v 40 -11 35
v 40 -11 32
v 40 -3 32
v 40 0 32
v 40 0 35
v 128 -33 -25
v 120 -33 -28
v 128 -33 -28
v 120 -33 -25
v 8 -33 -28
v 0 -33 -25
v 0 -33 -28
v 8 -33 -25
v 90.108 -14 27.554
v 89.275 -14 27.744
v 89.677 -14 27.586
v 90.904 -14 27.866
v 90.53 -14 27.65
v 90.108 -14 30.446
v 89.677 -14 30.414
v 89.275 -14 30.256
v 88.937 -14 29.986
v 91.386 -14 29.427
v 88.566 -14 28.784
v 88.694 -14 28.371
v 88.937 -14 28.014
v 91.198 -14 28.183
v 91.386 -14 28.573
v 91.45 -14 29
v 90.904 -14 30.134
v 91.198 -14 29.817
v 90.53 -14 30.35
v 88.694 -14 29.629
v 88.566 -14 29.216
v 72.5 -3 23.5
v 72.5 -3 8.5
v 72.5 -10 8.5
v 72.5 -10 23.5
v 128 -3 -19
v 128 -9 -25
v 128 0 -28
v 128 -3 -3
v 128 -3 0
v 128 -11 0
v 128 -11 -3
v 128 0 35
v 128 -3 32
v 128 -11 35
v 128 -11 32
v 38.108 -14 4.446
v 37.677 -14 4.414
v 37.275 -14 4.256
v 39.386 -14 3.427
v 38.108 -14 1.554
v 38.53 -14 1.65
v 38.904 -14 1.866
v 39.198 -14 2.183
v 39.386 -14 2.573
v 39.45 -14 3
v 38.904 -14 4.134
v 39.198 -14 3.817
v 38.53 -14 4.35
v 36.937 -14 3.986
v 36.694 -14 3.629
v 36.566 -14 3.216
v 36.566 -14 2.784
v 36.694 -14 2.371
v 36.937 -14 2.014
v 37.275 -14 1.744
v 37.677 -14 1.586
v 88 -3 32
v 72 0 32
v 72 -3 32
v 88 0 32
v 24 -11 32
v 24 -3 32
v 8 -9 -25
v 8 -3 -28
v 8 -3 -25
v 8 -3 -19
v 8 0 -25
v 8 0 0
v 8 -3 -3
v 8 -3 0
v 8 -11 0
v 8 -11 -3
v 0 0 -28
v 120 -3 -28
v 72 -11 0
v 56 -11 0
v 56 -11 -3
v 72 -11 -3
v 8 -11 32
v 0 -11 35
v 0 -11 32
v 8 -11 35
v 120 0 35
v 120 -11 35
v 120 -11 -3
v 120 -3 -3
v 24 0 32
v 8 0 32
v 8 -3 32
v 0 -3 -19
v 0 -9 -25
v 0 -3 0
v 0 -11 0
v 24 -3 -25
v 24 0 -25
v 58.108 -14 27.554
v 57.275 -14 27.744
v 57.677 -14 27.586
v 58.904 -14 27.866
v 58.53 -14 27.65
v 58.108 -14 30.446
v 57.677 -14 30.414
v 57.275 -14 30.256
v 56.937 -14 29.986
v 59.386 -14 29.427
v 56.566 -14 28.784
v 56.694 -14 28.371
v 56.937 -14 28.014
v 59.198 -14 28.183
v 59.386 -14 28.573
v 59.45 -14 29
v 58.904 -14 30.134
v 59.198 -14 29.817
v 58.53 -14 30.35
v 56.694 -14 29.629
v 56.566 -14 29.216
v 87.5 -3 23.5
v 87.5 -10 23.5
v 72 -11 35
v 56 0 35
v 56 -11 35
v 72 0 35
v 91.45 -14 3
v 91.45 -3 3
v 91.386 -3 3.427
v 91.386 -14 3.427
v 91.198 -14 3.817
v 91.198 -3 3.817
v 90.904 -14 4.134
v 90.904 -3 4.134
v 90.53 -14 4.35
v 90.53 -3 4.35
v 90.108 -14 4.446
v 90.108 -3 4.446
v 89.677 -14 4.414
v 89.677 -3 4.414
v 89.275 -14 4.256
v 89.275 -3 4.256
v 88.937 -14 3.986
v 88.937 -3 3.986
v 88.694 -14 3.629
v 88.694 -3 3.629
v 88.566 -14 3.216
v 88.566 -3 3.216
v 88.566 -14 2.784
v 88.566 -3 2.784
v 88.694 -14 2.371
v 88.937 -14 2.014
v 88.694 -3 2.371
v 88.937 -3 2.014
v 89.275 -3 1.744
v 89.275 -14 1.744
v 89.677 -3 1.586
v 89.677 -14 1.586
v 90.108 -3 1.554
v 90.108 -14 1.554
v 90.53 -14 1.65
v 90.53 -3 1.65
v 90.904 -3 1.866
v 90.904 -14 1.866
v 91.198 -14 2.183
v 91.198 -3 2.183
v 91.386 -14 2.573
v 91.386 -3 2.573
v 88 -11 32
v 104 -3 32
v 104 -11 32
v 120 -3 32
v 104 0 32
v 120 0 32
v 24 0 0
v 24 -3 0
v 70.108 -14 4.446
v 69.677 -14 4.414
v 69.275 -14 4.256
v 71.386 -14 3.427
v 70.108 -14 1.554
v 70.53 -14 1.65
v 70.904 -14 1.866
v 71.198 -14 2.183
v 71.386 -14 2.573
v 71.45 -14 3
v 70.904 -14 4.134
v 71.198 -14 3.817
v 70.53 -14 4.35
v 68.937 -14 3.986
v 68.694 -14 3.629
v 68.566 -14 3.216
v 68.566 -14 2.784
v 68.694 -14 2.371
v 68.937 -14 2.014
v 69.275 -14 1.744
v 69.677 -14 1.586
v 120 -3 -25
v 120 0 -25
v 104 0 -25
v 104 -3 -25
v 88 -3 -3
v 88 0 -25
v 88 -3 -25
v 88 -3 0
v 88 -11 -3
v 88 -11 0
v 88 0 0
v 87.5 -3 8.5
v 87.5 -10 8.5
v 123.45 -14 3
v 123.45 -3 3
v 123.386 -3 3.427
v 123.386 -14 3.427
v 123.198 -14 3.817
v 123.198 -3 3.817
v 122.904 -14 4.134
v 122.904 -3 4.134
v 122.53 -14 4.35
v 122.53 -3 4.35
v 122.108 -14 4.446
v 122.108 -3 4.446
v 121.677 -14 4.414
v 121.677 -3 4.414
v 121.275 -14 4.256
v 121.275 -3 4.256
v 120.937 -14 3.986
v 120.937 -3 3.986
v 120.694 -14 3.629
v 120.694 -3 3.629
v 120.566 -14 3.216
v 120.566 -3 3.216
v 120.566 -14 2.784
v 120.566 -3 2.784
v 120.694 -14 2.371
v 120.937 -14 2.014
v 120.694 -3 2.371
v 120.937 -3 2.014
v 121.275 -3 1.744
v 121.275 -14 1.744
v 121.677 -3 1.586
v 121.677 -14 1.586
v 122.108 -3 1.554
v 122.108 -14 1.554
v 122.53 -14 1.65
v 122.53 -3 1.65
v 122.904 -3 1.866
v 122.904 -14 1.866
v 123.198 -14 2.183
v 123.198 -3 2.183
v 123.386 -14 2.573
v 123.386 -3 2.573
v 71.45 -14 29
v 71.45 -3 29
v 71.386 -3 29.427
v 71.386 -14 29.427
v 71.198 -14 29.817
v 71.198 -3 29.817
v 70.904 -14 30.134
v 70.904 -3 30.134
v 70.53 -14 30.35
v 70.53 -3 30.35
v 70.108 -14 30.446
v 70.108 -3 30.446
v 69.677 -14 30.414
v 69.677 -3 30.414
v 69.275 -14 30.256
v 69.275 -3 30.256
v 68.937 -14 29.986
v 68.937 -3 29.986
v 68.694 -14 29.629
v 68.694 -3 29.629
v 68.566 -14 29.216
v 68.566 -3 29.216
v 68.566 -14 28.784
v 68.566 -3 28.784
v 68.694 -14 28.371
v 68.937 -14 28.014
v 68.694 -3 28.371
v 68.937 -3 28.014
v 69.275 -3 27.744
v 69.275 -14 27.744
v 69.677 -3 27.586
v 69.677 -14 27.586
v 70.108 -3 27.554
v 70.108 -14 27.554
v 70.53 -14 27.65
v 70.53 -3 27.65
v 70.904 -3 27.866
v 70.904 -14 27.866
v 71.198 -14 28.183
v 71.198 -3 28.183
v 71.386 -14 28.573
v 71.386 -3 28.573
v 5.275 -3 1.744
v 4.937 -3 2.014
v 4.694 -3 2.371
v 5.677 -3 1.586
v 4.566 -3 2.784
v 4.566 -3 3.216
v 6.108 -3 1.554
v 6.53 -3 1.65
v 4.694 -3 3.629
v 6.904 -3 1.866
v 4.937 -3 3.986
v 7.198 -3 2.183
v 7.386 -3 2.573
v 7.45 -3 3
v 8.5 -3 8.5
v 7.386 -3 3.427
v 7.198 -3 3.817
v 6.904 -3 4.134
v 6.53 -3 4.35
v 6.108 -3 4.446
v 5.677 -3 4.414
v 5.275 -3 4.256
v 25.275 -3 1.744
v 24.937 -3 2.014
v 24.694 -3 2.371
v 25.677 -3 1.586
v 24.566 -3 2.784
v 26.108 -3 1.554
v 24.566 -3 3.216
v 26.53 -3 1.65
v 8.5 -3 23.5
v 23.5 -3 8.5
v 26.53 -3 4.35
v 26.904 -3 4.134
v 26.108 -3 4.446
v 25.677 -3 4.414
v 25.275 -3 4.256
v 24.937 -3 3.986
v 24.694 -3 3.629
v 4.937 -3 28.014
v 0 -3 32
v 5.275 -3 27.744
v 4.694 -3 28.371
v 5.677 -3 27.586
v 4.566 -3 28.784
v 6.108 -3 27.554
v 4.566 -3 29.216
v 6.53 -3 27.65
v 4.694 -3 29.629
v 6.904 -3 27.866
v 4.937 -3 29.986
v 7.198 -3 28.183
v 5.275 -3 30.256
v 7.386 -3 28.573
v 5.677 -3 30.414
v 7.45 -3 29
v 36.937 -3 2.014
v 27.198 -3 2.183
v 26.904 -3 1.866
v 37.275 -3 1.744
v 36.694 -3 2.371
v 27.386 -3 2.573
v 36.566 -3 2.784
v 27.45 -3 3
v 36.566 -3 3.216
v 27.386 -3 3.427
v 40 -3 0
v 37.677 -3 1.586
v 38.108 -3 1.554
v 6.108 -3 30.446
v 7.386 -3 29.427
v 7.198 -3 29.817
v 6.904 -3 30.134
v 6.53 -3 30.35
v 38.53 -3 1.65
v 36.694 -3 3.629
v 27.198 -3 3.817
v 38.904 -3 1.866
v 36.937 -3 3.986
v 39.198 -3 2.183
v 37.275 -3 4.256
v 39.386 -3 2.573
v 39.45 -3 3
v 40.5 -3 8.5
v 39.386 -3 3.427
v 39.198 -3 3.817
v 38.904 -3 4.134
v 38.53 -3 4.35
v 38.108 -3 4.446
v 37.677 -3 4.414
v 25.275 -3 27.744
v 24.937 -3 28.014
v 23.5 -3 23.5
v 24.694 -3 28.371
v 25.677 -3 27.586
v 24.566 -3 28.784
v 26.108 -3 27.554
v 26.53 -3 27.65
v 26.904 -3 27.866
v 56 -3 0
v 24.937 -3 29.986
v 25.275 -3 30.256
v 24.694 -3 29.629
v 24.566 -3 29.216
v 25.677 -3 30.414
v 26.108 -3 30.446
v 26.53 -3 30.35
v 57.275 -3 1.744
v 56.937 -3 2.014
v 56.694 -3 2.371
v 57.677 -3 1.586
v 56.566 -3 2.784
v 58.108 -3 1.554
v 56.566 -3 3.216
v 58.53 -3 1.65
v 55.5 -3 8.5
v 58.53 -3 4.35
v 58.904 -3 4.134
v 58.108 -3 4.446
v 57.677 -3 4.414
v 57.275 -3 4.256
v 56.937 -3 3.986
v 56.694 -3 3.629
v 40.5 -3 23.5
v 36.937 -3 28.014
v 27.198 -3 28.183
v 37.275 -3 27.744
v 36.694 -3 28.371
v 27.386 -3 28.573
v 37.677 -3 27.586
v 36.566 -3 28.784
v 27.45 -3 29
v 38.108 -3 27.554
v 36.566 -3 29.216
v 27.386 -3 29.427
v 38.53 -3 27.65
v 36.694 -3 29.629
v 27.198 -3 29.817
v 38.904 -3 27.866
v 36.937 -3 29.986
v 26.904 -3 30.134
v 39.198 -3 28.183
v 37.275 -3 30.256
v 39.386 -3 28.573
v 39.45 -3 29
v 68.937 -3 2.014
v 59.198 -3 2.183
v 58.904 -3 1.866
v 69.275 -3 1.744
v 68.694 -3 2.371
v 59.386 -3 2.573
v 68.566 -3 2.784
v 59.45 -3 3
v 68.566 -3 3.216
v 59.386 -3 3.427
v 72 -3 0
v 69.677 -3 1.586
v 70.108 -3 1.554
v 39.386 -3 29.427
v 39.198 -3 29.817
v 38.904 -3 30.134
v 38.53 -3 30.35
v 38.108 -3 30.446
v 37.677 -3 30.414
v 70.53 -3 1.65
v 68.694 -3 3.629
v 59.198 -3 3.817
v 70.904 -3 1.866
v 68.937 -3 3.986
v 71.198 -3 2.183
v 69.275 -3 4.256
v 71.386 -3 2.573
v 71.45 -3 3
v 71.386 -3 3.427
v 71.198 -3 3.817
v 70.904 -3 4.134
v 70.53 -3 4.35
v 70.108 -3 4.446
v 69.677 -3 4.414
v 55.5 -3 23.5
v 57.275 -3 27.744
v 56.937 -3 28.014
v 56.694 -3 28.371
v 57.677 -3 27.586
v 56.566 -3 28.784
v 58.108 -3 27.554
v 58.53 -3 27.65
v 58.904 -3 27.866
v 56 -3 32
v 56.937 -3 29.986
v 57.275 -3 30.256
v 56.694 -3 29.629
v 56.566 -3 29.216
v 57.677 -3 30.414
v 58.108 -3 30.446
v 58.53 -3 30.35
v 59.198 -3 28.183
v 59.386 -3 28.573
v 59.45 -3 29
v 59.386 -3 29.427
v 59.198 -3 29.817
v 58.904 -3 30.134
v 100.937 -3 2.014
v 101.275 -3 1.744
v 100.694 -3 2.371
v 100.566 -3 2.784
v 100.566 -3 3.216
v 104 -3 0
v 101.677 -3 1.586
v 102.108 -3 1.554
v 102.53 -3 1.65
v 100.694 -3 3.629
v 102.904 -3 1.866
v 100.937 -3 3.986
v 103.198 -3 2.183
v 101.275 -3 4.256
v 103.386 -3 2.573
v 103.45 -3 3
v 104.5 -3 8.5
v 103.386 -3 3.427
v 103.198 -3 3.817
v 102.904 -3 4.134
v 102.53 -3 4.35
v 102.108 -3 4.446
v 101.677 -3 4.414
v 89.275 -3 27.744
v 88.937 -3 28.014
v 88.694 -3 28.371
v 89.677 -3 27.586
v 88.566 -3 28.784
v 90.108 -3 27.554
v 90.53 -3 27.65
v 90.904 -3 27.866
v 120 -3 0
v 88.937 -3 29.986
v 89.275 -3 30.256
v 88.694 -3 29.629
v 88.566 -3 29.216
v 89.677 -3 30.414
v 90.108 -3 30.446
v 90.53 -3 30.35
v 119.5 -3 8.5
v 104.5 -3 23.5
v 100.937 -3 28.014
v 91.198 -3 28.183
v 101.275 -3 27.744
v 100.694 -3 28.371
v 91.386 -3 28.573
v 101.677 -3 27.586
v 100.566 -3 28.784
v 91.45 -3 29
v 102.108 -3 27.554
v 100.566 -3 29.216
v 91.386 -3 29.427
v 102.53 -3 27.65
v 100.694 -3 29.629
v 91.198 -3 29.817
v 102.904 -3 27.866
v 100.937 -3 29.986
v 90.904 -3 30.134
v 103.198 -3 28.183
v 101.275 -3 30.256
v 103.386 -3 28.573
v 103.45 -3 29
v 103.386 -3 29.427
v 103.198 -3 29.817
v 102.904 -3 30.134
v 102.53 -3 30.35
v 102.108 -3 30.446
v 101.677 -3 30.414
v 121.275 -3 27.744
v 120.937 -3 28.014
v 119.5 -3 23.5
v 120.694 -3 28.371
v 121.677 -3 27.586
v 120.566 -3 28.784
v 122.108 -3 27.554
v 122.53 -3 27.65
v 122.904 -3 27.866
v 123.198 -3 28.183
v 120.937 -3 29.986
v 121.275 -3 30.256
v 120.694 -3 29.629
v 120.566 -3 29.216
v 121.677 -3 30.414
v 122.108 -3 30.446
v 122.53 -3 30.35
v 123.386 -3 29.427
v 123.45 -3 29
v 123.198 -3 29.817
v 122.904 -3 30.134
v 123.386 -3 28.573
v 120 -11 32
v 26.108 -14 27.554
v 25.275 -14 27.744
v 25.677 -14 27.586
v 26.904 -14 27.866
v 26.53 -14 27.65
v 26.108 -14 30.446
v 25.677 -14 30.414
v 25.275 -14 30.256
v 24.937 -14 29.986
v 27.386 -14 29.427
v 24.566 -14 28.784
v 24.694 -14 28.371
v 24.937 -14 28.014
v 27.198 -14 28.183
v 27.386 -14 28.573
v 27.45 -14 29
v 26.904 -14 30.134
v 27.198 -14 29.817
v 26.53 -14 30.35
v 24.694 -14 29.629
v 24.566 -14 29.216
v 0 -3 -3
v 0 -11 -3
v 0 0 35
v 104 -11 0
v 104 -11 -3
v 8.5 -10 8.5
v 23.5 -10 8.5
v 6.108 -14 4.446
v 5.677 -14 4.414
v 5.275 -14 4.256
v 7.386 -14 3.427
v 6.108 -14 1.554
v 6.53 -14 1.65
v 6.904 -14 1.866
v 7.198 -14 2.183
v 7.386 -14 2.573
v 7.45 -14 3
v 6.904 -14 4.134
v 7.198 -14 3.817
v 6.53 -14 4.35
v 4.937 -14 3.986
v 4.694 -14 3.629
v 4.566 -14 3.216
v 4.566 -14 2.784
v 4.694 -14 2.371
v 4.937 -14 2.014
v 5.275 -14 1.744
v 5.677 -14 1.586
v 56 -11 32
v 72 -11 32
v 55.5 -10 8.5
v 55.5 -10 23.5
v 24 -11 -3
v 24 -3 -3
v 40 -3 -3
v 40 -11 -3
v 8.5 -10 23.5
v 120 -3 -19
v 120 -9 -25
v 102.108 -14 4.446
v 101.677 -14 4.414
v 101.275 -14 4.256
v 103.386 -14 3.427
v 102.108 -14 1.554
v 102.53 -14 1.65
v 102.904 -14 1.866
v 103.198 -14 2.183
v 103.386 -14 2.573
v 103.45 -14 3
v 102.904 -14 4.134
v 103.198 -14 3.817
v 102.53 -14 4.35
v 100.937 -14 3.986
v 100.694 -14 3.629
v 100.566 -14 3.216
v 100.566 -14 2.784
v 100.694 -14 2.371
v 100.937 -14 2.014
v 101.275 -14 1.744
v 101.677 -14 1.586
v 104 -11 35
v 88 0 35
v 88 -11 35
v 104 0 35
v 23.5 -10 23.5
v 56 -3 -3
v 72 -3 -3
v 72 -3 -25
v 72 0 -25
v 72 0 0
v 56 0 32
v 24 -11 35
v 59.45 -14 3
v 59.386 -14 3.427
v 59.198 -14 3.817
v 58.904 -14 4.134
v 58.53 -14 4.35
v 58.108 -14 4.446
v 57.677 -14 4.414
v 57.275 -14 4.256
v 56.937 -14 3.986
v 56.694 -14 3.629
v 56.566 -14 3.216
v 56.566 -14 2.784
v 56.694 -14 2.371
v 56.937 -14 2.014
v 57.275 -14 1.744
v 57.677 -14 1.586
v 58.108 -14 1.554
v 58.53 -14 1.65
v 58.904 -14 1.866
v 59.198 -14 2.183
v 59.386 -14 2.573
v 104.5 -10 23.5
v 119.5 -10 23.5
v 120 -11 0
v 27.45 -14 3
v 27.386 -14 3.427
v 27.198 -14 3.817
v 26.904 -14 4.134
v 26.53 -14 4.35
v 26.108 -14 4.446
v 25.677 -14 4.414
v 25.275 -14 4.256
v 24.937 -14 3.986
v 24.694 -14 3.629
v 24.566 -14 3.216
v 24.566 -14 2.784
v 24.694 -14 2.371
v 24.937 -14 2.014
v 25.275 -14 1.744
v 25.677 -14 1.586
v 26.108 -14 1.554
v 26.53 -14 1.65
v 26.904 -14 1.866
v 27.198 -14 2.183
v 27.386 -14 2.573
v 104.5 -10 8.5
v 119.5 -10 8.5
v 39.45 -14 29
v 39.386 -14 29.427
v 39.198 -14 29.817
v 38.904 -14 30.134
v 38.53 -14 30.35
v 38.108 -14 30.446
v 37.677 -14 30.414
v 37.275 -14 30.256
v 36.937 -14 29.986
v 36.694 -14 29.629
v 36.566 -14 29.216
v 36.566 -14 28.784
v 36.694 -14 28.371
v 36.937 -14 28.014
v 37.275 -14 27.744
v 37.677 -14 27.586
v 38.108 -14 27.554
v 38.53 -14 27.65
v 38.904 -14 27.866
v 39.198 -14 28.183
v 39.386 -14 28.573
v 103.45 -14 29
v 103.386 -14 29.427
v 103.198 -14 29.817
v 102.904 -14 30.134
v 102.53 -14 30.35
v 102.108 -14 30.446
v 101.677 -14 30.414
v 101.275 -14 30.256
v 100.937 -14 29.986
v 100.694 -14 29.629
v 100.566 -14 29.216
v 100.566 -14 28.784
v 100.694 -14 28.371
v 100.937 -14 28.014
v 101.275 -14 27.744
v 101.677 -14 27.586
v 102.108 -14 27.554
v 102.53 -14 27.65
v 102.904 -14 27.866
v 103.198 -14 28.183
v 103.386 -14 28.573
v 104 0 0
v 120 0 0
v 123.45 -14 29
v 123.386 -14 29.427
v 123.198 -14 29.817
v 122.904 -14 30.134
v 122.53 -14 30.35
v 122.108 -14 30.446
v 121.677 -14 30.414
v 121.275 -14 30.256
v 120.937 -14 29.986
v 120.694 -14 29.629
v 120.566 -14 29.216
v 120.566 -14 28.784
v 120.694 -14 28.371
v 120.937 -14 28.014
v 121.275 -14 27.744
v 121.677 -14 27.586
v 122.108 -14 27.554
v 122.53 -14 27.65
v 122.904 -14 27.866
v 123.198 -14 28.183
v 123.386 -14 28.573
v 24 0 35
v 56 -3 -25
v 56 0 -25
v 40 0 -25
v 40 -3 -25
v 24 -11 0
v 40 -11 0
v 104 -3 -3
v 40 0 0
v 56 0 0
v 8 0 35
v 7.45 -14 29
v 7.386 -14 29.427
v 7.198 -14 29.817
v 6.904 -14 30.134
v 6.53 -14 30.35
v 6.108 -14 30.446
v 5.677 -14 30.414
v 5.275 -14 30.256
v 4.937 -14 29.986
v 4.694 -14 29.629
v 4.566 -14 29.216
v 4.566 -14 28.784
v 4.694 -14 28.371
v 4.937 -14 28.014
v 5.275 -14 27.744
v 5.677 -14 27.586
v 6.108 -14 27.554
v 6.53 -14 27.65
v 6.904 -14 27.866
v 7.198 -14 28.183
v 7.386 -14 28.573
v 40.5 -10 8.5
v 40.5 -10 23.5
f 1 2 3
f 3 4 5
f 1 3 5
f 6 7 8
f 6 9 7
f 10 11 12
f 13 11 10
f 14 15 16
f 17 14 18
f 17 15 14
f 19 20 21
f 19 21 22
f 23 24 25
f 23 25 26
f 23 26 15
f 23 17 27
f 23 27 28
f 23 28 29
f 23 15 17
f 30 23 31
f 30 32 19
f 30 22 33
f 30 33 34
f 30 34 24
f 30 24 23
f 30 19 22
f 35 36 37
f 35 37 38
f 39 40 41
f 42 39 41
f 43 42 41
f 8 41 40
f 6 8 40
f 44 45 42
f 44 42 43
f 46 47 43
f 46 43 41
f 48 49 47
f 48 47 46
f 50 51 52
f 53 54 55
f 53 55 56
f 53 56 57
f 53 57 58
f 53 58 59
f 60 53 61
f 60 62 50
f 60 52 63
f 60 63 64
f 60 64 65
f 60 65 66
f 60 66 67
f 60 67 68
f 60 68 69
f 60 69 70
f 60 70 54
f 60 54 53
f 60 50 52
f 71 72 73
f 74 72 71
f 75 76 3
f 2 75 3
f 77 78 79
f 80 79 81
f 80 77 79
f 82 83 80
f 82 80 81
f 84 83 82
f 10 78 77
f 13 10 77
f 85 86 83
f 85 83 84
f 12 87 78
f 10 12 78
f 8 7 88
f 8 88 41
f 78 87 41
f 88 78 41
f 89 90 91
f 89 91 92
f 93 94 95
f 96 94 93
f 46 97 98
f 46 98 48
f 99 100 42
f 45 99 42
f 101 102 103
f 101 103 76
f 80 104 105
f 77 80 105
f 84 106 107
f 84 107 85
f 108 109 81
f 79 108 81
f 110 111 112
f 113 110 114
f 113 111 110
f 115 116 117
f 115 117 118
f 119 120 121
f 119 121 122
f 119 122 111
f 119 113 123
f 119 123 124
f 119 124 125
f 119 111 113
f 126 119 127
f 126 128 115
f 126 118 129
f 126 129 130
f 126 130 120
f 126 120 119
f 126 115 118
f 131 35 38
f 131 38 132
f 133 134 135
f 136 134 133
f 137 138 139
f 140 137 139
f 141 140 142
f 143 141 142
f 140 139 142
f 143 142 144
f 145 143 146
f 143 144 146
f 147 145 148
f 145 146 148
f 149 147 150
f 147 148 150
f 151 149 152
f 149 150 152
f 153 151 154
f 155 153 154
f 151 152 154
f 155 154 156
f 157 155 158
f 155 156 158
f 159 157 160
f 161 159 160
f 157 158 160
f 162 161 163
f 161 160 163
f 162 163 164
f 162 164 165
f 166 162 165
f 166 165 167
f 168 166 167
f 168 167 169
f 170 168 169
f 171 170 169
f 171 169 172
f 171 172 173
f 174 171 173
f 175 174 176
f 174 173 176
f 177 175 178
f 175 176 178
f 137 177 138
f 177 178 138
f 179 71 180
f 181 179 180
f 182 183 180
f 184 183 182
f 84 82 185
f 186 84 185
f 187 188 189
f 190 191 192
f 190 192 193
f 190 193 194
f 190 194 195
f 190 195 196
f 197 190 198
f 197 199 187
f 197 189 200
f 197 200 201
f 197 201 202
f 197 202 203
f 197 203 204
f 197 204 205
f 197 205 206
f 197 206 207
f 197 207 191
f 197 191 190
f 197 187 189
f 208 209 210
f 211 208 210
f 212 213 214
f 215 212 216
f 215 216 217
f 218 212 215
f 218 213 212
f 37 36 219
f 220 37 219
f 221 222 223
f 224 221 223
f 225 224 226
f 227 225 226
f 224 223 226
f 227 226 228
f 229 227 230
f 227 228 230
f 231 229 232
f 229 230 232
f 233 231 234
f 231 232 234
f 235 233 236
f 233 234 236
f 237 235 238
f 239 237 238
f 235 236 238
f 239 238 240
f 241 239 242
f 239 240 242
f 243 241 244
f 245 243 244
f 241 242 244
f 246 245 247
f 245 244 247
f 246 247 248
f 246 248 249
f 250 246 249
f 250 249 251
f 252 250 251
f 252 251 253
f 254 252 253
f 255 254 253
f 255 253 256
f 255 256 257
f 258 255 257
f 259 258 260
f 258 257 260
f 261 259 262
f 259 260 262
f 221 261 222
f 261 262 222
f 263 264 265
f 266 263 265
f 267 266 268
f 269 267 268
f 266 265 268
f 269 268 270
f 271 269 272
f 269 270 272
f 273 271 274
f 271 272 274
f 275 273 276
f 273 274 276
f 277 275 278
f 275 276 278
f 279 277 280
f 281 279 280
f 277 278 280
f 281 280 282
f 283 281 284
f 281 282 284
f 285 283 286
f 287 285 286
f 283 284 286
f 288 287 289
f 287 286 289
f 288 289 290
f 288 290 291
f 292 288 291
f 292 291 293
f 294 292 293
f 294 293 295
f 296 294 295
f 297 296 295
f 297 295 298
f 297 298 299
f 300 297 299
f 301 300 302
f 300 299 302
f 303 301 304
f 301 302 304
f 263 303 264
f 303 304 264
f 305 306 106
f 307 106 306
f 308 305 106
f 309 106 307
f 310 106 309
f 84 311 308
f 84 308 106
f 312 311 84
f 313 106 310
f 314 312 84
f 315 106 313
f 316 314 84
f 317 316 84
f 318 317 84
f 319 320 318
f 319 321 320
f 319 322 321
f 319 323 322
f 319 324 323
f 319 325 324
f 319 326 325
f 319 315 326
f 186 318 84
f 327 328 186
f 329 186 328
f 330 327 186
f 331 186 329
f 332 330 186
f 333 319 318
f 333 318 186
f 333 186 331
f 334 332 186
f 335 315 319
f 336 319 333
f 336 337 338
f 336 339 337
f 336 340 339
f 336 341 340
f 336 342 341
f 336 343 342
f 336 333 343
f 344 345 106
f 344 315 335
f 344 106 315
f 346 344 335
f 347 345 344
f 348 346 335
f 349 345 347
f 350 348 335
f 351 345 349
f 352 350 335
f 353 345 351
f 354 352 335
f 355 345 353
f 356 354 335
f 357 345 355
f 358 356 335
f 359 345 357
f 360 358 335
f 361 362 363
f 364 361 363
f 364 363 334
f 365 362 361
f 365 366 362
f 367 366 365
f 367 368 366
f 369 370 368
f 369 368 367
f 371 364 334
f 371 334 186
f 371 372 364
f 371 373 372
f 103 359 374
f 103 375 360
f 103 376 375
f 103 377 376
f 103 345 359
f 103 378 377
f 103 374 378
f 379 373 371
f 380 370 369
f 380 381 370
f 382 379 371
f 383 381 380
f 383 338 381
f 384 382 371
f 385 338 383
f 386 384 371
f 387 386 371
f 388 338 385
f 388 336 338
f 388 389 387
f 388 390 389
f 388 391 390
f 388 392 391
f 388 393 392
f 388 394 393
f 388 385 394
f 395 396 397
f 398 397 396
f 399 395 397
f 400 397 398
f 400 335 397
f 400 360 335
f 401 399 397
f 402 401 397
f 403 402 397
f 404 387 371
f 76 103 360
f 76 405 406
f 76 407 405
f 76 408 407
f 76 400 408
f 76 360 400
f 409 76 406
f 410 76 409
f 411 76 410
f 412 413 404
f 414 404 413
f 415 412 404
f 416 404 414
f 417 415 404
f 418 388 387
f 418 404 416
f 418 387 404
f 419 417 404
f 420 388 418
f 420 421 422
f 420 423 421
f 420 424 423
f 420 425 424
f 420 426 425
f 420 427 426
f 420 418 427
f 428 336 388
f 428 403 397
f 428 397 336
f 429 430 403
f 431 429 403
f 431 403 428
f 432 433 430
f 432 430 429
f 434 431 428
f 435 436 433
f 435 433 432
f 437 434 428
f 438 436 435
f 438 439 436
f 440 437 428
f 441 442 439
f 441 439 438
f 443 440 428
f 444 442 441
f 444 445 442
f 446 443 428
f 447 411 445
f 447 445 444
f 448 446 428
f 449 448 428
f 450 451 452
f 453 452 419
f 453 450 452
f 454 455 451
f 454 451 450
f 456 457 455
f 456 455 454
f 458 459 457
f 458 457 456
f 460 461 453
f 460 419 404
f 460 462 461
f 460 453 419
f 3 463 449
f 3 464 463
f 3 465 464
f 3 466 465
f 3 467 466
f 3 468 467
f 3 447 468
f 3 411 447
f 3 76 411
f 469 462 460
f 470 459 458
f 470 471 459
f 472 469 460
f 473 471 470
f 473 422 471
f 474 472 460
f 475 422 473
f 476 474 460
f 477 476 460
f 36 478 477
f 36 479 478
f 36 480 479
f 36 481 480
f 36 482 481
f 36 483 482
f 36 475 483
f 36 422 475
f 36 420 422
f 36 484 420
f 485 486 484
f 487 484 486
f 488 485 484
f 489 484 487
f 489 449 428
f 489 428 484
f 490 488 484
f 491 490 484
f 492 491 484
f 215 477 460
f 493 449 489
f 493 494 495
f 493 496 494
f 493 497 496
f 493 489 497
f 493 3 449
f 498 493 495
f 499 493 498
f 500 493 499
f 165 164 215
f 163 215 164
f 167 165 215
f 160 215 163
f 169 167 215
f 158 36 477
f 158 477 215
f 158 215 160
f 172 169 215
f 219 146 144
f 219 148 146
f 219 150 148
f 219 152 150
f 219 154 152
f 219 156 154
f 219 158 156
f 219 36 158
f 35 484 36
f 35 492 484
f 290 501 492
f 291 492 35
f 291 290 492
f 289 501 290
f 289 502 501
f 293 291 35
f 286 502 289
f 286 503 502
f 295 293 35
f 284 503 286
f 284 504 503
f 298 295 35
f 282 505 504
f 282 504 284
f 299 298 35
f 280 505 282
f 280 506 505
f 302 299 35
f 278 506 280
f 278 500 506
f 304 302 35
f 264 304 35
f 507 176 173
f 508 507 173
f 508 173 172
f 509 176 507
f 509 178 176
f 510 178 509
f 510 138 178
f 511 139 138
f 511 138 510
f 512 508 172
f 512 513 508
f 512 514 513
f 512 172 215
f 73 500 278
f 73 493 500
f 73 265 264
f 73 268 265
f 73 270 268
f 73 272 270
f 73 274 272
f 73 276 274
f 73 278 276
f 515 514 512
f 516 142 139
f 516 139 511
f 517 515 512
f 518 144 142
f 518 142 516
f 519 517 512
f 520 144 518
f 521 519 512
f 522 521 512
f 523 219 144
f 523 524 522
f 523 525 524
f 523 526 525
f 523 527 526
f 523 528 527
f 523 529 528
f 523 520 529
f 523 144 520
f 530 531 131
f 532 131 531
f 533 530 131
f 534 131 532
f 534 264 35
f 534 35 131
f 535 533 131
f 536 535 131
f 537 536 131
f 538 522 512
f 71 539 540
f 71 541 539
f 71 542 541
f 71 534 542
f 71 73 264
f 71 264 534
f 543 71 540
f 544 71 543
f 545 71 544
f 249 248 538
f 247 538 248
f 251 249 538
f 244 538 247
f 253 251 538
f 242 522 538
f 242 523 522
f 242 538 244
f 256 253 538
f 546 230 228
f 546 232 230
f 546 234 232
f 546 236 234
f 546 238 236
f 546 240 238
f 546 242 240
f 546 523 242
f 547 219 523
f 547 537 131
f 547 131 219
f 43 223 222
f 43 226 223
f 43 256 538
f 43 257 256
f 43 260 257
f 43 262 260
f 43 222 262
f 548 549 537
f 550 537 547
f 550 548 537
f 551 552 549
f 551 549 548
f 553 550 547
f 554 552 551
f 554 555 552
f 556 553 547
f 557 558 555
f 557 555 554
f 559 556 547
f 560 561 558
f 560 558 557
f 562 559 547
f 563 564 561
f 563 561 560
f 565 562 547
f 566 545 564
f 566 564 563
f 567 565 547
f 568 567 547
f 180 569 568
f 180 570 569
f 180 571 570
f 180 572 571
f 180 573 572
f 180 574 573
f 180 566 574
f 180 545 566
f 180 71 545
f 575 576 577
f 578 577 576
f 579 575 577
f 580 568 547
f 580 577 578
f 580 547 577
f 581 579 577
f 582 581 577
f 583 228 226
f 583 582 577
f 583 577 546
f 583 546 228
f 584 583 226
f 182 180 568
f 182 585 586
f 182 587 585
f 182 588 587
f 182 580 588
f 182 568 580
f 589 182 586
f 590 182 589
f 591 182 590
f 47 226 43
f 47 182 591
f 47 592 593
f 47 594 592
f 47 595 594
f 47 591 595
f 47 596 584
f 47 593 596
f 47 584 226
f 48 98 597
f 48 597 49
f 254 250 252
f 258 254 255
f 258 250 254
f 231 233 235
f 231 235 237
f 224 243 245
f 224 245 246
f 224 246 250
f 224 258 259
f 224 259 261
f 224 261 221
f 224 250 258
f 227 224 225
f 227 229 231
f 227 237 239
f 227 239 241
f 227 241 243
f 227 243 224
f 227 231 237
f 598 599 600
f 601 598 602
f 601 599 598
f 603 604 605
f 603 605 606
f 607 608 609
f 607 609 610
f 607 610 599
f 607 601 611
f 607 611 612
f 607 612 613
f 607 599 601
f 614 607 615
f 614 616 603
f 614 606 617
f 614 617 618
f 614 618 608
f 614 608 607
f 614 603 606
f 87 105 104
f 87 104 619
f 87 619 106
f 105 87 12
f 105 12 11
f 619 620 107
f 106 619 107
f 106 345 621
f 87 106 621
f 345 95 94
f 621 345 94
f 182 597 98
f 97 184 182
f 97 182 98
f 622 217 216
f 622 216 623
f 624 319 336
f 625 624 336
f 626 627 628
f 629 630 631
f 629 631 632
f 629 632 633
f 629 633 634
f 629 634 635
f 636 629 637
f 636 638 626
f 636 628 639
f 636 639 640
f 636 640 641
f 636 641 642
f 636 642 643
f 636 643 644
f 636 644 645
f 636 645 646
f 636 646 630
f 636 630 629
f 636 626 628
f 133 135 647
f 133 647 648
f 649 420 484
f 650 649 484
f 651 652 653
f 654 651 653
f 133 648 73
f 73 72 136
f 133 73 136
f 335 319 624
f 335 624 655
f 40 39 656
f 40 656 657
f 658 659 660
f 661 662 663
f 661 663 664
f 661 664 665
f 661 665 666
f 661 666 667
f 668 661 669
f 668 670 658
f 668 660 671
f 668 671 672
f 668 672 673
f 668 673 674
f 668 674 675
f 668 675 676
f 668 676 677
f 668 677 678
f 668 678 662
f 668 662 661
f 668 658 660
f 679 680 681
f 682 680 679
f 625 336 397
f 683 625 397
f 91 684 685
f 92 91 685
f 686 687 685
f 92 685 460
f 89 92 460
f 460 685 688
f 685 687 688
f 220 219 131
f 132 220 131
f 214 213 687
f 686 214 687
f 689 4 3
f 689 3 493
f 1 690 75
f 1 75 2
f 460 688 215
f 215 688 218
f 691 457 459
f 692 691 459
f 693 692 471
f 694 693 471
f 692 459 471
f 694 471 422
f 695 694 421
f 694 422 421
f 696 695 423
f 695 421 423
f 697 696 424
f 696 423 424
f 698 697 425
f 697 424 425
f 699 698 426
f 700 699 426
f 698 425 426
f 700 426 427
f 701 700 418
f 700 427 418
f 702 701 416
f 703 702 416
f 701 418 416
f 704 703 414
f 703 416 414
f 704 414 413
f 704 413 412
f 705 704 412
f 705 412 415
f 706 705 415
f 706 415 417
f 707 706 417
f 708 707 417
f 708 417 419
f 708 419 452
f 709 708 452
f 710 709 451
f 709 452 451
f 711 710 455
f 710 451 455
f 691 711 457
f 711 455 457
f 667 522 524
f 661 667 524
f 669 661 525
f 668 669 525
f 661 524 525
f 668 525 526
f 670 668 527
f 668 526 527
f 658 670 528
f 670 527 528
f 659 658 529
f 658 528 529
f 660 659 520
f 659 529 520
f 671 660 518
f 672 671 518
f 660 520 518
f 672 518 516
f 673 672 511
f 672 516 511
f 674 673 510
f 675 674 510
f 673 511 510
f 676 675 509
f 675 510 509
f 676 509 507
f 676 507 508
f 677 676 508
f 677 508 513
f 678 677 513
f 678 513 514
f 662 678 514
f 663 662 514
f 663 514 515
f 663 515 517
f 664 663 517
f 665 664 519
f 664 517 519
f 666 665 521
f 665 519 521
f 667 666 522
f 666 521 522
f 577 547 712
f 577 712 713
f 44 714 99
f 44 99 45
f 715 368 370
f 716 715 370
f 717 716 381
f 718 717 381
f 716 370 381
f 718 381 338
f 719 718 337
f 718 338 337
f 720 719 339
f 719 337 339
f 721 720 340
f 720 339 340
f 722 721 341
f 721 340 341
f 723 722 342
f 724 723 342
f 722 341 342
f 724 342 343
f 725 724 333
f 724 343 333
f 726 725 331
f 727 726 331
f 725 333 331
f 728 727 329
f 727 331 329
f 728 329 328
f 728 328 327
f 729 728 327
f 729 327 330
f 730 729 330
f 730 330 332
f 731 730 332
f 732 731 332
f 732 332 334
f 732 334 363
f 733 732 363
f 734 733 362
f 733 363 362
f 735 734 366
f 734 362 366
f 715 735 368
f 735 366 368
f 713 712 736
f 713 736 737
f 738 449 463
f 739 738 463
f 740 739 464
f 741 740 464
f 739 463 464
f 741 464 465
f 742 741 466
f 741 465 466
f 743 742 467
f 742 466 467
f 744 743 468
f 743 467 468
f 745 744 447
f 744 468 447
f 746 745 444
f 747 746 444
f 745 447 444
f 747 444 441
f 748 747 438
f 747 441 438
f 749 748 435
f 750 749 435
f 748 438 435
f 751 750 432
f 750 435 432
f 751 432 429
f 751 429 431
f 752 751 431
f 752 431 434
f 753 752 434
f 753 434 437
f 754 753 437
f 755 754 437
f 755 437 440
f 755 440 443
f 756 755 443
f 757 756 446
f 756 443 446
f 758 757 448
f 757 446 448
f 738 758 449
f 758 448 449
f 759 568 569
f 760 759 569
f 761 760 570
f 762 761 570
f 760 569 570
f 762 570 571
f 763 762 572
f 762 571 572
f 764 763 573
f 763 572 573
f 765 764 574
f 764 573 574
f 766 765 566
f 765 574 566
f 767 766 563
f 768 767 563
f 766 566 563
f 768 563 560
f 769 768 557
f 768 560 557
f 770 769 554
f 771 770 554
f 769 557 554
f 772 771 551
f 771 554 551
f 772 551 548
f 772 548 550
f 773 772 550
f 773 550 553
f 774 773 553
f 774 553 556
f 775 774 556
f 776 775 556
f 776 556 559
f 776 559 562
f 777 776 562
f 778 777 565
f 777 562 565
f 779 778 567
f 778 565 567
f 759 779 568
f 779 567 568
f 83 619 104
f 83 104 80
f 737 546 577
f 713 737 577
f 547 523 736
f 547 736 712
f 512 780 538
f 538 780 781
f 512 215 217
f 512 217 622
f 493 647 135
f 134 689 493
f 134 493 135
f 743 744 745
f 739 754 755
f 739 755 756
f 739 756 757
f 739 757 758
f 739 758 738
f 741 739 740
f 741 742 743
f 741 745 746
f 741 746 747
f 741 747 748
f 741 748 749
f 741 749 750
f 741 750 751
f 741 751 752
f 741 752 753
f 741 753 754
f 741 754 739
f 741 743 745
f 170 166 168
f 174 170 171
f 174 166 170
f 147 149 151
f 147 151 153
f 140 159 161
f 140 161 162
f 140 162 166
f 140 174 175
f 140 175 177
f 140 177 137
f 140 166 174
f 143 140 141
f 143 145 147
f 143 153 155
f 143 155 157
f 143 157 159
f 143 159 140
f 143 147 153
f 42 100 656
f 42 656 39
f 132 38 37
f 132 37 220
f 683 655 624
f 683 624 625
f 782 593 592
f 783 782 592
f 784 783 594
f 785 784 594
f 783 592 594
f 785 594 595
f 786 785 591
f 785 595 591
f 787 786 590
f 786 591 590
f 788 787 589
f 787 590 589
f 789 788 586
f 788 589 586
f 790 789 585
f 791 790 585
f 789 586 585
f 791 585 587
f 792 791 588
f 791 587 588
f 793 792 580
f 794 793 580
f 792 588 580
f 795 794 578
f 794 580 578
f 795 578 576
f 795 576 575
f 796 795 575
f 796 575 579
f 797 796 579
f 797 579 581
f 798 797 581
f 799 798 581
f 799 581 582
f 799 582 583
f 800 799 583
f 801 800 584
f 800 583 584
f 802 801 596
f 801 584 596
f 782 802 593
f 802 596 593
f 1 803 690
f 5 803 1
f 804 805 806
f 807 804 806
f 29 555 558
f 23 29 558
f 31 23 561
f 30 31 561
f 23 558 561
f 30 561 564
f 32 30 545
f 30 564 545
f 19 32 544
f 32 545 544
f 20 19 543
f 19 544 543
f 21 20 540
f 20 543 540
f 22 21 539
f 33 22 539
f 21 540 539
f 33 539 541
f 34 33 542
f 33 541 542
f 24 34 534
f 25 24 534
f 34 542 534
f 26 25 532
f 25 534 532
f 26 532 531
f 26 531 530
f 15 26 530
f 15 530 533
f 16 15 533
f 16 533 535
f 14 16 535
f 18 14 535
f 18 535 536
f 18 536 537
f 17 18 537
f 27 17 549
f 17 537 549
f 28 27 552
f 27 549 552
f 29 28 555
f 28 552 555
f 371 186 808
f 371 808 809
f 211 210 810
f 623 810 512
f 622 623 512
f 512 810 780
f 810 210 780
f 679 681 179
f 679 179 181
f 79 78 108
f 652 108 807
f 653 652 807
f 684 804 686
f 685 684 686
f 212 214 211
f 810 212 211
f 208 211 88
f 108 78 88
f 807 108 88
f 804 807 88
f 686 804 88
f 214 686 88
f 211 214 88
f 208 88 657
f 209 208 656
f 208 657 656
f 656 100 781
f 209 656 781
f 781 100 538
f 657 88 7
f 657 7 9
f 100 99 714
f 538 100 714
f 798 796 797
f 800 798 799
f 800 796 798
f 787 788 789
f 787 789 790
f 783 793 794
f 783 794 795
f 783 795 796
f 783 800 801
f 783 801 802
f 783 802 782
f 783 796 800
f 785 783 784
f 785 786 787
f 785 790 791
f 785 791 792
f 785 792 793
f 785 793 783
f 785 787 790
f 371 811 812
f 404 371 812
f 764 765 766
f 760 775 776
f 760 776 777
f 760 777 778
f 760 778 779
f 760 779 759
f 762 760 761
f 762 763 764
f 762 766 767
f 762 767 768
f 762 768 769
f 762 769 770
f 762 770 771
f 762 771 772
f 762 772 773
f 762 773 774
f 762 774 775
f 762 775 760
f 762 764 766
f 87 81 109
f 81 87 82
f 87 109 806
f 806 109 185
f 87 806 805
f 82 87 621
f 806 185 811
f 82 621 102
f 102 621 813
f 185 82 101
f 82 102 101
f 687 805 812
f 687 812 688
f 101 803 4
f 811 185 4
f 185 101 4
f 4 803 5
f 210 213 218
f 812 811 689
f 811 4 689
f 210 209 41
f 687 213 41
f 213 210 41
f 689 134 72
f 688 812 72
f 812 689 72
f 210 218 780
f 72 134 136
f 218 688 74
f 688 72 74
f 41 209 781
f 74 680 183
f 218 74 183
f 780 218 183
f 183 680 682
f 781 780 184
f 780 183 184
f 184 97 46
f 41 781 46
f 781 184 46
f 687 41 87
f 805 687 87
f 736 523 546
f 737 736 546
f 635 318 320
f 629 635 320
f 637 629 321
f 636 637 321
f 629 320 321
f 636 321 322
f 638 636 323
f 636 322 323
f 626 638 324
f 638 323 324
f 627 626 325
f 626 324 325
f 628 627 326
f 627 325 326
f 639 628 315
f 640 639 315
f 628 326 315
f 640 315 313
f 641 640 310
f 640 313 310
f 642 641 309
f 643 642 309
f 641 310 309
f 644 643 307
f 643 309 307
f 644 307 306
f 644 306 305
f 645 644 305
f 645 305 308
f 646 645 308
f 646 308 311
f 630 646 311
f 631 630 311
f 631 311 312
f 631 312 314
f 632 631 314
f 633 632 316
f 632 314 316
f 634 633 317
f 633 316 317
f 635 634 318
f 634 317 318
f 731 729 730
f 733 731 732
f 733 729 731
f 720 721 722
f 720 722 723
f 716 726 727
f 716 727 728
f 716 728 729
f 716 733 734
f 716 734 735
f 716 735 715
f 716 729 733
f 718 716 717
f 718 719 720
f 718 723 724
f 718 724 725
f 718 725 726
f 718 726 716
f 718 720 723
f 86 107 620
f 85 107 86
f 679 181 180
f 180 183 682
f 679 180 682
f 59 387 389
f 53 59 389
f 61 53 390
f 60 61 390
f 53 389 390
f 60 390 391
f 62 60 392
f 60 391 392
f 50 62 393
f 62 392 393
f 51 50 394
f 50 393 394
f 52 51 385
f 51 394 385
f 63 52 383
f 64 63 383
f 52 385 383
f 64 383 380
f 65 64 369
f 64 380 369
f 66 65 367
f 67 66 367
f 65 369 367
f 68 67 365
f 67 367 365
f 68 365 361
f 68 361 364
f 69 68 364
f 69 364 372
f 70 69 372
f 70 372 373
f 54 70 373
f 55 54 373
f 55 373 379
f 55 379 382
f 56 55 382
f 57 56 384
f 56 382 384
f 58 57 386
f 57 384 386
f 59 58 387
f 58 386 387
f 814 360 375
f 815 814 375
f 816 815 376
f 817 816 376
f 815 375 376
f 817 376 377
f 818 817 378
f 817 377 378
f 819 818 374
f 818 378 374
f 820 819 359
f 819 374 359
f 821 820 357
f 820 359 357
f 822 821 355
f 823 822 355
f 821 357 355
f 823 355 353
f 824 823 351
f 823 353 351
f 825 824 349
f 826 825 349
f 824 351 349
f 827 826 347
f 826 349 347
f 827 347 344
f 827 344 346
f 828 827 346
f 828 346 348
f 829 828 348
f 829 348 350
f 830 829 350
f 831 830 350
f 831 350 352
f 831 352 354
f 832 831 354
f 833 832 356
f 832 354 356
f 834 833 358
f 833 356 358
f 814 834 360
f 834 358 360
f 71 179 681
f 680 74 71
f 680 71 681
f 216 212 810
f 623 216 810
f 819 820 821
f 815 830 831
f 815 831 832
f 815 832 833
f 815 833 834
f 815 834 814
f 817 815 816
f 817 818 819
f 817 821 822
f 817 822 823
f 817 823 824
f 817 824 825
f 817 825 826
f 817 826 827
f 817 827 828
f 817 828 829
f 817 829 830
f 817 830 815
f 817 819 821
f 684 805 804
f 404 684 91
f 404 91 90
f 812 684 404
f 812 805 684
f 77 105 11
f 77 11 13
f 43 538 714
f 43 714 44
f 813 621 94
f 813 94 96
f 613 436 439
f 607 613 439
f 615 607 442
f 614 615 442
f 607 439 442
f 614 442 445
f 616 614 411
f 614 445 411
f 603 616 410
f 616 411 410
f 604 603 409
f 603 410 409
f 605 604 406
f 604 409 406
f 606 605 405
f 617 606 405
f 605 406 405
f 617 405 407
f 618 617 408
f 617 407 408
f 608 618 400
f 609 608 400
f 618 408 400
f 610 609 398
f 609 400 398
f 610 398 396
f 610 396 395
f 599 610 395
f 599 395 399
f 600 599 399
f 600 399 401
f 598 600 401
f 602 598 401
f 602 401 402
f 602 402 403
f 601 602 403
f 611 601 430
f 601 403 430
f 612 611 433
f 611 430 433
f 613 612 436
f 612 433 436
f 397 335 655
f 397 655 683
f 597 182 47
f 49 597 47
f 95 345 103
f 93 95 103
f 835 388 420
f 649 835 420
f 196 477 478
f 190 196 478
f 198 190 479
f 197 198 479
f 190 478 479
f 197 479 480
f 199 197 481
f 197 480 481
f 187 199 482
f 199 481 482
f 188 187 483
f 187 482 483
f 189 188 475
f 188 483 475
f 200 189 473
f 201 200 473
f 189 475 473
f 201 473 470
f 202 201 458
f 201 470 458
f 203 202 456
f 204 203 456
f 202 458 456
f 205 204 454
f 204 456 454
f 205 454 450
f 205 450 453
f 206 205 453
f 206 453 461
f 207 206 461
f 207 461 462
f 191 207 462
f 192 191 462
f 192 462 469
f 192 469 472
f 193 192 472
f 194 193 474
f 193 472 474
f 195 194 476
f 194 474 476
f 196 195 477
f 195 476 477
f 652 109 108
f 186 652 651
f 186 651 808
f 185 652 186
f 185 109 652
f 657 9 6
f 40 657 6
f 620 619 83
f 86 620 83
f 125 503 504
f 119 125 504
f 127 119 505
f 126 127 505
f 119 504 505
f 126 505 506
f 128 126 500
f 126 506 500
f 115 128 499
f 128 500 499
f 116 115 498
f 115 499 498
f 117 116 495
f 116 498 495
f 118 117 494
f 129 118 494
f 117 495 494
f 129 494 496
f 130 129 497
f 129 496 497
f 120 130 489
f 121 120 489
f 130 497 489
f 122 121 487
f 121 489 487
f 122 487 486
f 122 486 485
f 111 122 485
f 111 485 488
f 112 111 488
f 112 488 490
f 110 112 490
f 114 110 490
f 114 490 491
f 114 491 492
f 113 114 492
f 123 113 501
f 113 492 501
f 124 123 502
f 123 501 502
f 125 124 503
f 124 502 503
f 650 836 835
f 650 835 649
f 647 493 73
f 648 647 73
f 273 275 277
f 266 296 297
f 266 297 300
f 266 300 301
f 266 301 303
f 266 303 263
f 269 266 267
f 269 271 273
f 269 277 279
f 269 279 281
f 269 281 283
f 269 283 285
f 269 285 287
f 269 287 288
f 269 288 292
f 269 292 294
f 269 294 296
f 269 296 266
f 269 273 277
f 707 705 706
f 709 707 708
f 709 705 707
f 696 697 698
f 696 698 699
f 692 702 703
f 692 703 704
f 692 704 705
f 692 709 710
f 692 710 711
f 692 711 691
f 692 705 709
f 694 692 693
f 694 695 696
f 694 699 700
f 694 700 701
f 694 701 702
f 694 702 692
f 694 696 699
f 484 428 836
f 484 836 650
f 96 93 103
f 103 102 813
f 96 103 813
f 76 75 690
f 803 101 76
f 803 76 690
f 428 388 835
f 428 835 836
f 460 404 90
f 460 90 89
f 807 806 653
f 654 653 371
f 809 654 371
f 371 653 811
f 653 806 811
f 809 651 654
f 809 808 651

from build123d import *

# Parameters (mm, degrees)
SKETCH_W               = 32
SKETCH_H               = 32
PAD_DEPTH              = 3
SKETCH001_R            = 1.45
PAD001_DEPTH           = 11
SKETCH002_W            = 15
SKETCH002_H            = 15
PAD002_DEPTH           = 7
SKETCH003_W            = 8
SKETCH003_H            = 3
PAD003_DEPTH           = 11
PAD004_DEPTH           = 3
SKETCH005_W            = 32
SKETCH005_H            = 3
PAD005_DEPTH           = 30
LINEARPATTERN_COUNT    = 4
LINEARPATTERN_PITCH    = 32
LINEARPATTERN001_COUNT = 4
LINEARPATTERN001_PITCH = 32
LINEARPATTERN002_COUNT = 4
LINEARPATTERN002_PITCH = 32
LINEARPATTERN003_COUNT = 4
LINEARPATTERN003_PITCH = 32
LINEARPATTERN004_COUNT = 4
LINEARPATTERN004_PITCH = 32
LINEARPATTERN005_COUNT = 4
LINEARPATTERN005_PITCH = 32
SKETCH006_W            = 112
SKETCH006_H            = 30
POCKET_DEPTH           = 3
PAD006_DEPTH           = 8
PAD007_DEPTH           = 8


with BuildPart() as part:
    # Sketch → Pad (new body)
    with BuildSketch(Plane.XZ):
        with Locations((16, 16)):
            Rectangle(SKETCH_W, SKETCH_H)
    pad = extrude(amount=PAD_DEPTH)

    # Sketch001 (on Face6 of Pad) → Pad001 (join)
    with BuildSketch(Plane.XZ.offset(3)):
        with Locations((6, 3)):
            Circle(SKETCH001_R)
        with Locations((26, 3)):
            Circle(SKETCH001_R)
        with Locations((26, 29)):
            Circle(SKETCH001_R)
        with Locations((6, 29)):
            Circle(SKETCH001_R)
    pad001 = extrude(amount=PAD001_DEPTH)

    # Sketch002 (on Face5 of Pad001) → Pad002 (join)
    with BuildSketch(Plane.XZ.offset(3)):
        with Locations((16, 16)):
            Rectangle(SKETCH002_W, SKETCH002_H)
    pad002 = extrude(amount=PAD002_DEPTH)

    # Sketch003 → Pad003 (join)
    with BuildSketch(Plane.XZ):
        with Locations((4, -1.5)):
            Rectangle(SKETCH003_W, SKETCH003_H)
        with Locations((4, 33.5)):
            Rectangle(SKETCH003_W, SKETCH003_H)
        with Locations((28, 33.5)):
            Rectangle(SKETCH003_W, SKETCH003_H)
        with Locations((28, -1.5)):
            Rectangle(SKETCH003_W, SKETCH003_H)
    pad003 = extrude(amount=PAD003_DEPTH)

    # Sketch004 → Pad004 (join)
    with BuildSketch(Plane.XZ):
        Polygon((0, -2.999526), (0, -27.999526), (32, -27.999526), (32, -3), (24, -3), (24, -25), (8, -25), (8, -3), align=None)
    pad004 = extrude(amount=PAD004_DEPTH)

    # Sketch005 (on Face42 of Pad004) → Pad005 (join)
    with BuildSketch(Plane.XZ.offset(3)):
        with Locations((16, -26.499526)):
            Rectangle(SKETCH005_W, SKETCH005_H)
    pad005 = extrude(amount=PAD005_DEPTH)

    # LinearPattern: Pad ×4
    with Locations(*[(i * LINEARPATTERN_PITCH, 0, 0) for i in range(1, LINEARPATTERN_COUNT)]):
        add(pad)

    # LinearPattern001: Pad001 ×4
    with Locations(*[(i * LINEARPATTERN001_PITCH, 0, 0) for i in range(1, LINEARPATTERN001_COUNT)]):
        add(pad001)

    # LinearPattern002: Pad002 ×4
    with Locations(*[(i * LINEARPATTERN002_PITCH, 0, 0) for i in range(1, LINEARPATTERN002_COUNT)]):
        add(pad002)

    # LinearPattern003: Pad003 ×4
    with Locations(*[(i * LINEARPATTERN003_PITCH, 0, 0) for i in range(1, LINEARPATTERN003_COUNT)]):
        add(pad003)

    # LinearPattern004: Pad004 ×4
    with Locations(*[(i * LINEARPATTERN004_PITCH, 0, 0) for i in range(1, LINEARPATTERN004_COUNT)]):
        add(pad004)

    # LinearPattern005: Pad005 ×4
    with Locations(*[(i * LINEARPATTERN005_PITCH, 0, 0) for i in range(1, LINEARPATTERN005_COUNT)]):
        add(pad005)

    # Sketch006 (on Face120 of LinearPattern005) → Pocket (cut)
    with BuildSketch(Plane(origin=(0, 0, -27.999526), x_dir=(1, 0, 0), z_dir=(0, 0, -1))):
        with Locations((64, 18)):
            Rectangle(SKETCH006_W, SKETCH006_H)
    extrude(amount=-POCKET_DEPTH, mode=Mode.SUBTRACT)

    # Sketch007 (on Face135 of Pocket) → Pad006 (join)
    with BuildSketch(Plane(origin=(0, 0, 0), x_dir=(0, 0, -1), z_dir=(-1, 0, 0))):
        Polygon((24.999526, 3), (18.999526, 3), (24.999526, 9), align=None)
    extrude(amount=-PAD006_DEPTH)

    # Sketch008 (on Face192 of Pad006) → Pad007 (join)
    with BuildSketch(Plane(origin=(128, 0, 0), x_dir=(0, 0, 1), z_dir=(1, 0, 0))):
        Polygon((-24.999526, 3), (-18.999526, 3), (-24.999526, 9), align=None)
    extrude(amount=-PAD007_DEPTH)


solid = part.part
